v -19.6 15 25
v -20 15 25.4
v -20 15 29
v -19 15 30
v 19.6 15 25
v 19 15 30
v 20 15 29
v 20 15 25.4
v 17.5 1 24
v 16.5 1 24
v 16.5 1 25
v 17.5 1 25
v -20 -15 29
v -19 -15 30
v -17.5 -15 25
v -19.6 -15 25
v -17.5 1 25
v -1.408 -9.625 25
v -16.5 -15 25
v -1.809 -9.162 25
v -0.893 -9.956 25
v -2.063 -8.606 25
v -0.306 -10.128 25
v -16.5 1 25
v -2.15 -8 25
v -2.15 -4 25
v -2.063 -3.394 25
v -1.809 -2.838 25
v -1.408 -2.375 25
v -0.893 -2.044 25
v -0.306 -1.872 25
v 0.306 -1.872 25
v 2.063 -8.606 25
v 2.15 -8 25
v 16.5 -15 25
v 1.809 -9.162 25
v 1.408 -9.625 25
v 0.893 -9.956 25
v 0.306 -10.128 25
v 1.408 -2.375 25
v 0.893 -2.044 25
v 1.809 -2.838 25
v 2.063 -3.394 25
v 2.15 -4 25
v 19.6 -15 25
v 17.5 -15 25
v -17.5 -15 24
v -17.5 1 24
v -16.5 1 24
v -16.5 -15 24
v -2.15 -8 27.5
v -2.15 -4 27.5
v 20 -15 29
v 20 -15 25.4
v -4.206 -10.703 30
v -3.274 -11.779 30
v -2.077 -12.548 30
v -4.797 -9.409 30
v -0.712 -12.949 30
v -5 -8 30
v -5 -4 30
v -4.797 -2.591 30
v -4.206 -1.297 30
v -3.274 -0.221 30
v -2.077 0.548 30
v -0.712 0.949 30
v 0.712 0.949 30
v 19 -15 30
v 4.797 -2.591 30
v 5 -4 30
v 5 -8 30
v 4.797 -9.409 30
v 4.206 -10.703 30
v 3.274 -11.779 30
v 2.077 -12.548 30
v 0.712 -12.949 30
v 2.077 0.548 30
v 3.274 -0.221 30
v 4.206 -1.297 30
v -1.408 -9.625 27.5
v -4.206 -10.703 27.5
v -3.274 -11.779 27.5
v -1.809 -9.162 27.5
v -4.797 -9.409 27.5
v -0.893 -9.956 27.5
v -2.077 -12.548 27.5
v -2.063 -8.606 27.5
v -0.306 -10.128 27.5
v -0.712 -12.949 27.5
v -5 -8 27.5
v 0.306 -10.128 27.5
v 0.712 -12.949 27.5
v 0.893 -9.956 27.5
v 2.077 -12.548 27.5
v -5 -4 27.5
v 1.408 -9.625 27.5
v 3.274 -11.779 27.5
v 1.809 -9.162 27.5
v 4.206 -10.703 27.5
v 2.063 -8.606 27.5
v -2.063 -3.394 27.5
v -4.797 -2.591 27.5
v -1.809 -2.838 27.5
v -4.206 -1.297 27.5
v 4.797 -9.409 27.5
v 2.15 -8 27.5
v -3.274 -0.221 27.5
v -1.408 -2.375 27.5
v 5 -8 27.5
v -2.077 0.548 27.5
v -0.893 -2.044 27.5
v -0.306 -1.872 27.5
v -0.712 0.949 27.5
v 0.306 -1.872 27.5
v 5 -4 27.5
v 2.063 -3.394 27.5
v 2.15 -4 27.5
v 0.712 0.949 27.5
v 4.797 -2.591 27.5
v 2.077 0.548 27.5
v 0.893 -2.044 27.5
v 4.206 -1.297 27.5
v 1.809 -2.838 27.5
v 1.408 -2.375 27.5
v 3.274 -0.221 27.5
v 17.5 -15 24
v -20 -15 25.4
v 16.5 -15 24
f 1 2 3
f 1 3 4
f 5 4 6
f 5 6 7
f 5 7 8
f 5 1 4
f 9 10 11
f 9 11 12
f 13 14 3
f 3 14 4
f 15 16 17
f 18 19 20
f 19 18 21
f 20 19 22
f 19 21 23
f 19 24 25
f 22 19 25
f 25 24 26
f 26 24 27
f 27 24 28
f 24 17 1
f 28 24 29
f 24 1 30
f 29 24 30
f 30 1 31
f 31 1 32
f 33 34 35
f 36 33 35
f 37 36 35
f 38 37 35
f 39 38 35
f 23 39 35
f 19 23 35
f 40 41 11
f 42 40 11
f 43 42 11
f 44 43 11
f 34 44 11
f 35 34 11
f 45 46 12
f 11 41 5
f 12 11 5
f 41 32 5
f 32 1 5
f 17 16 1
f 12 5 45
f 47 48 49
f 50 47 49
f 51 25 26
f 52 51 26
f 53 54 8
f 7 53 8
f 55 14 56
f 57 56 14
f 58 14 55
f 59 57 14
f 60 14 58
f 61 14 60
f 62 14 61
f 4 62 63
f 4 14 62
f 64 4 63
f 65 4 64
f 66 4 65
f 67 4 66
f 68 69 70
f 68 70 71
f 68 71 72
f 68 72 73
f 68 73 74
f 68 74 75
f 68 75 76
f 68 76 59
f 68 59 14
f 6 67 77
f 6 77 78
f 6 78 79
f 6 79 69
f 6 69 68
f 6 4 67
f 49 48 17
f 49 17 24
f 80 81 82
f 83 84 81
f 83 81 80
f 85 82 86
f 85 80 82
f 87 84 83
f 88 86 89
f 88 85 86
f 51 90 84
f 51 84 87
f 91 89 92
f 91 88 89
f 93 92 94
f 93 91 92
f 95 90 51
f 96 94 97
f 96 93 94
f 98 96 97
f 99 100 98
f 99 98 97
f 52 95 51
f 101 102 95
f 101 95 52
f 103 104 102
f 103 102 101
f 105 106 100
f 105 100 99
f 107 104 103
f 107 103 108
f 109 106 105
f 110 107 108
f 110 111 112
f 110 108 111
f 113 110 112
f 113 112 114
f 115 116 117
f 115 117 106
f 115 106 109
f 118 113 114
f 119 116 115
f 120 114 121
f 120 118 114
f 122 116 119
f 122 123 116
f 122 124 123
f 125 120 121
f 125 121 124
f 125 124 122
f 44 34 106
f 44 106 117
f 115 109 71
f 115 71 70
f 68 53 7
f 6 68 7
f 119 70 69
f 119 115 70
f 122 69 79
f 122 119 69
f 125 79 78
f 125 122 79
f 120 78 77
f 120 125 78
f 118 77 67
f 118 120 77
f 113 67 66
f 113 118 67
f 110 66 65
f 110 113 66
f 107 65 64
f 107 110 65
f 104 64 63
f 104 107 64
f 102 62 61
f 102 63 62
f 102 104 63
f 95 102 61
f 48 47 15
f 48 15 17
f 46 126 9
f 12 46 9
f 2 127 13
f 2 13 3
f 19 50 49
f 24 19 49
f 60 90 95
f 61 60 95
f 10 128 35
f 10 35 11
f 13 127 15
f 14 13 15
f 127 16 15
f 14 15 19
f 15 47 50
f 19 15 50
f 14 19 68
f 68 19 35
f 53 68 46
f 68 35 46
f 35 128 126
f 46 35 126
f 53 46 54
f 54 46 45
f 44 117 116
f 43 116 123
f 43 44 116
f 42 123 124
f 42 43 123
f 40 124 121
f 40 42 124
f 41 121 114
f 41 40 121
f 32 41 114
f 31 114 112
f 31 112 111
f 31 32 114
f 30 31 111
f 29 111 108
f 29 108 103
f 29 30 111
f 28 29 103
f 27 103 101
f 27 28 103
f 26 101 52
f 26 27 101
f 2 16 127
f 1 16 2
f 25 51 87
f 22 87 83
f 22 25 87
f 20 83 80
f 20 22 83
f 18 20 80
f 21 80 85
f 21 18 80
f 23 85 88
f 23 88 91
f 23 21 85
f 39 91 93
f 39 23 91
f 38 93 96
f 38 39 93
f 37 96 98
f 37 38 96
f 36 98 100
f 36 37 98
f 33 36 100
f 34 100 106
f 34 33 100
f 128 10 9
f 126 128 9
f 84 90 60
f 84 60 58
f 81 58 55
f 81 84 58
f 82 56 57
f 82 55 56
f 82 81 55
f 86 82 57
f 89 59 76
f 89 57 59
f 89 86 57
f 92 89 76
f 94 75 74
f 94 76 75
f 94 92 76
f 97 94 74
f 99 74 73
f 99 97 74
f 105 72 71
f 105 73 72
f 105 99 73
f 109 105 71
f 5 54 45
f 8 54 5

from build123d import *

# Parameters (mm, degrees)
CYLINDER006_R      = 2.15
CYLINDER006_DEPTH  = 10
CYLINDER005_R      = 2.15
CYLINDER005_DEPTH  = 10
BOX012_W           = 4.3
BOX012_H           = 4
BOX012_DEPTH       = 10
CYLINDER008_R      = 5
CYLINDER008_DEPTH  = 10
BOX013_W           = 10
BOX013_H           = 4
BOX013_DEPTH       = 10
CYLINDER007_R      = 5
CYLINDER007_DEPTH  = 10
BOX010_W           = 1
BOX010_H           = 16
BOX010_DEPTH       = 2
BOX009_W           = 40
BOX009_H           = 30
BOX009_DEPTH       = 5
BOX011_W           = 1
BOX011_H           = 16
BOX011_DEPTH       = 2
CHAMFER003002_SIZE = 1
CHAMFER003003_SIZE = 0.4


with BuildPart() as cylinder006:
    # Cylinder006 → Cylinder006 (new body)
    with BuildSketch(Plane(origin=(0, -8, 0), x_dir=(1, 0, 0), z_dir=(0, 0, 1))):
        Circle(CYLINDER006_R)
    extrude(amount=CYLINDER006_DEPTH)


with BuildPart() as cylinder005:
    # Cylinder005 → Cylinder005 (new body)
    with BuildSketch(Plane(origin=(0, -4, 0), x_dir=(1, 0, 0), z_dir=(0, 0, 1))):
        Circle(CYLINDER005_R)
    extrude(amount=CYLINDER005_DEPTH)


with BuildPart() as fusion009003:
    # Box012 → Box012 (new body)
    with BuildSketch(Plane(origin=(-2.15, -8, 0), x_dir=(1, 0, 0), z_dir=(0, 0, 1))):
        with Locations((2.15, 2)):
            Rectangle(BOX012_W, BOX012_H)
    extrude(amount=BOX012_DEPTH)

    # Fusion009003: union Cylinder006, Cylinder005
    add(cylinder006.part)
    add(cylinder005.part)


with BuildPart() as cylinder008:
    # Cylinder008 → Cylinder008 (new body)
    with BuildSketch(Plane(origin=(0, -8, 0), x_dir=(1, 0, 0), z_dir=(0, 0, 1))):
        Circle(CYLINDER008_R)
    extrude(amount=CYLINDER008_DEPTH)


with BuildPart() as cube013:
    # Box013 → Box013 (new body)
    with BuildSketch(Plane(origin=(-5, -8, 0), x_dir=(1, 0, 0), z_dir=(0, 0, 1))):
        with Locations((5, 2)):
            Rectangle(BOX013_W, BOX013_H)
    extrude(amount=BOX013_DEPTH)


with BuildPart() as fusion009005:
    # Cylinder007 → Cylinder007 (new body)
    with BuildSketch(Plane(origin=(0, -4, 0), x_dir=(1, 0, 0), z_dir=(0, 0, 1))):
        Circle(CYLINDER007_R)
    extrude(amount=CYLINDER007_DEPTH)

    # Fusion009004: union Cylinder008, Cube013
    add(cylinder008.part)
    add(cube013.part)


with BuildPart() as fusion009005_1:
    # Fusion009004 placement: moved
    add(fusion009005.part.moved(Location((0, 0, 10))))

    # Fusion009005: union Fusion009003
    add(fusion009003.part)


with BuildPart() as fusion009005_2:
    # Fusion009005 placement: moved
    add(fusion009005_1.part.moved(Location((0, 0, 17.5))))


with BuildPart() as cube010:
    # Box010 → Box010 (new body)
    with BuildSketch(Plane(origin=(-17.5, -15, 24), x_dir=(1, 0, 0), z_dir=(0, 0, 1))):
        with Locations((0.5, 8)):
            Rectangle(BOX010_W, BOX010_H)
    extrude(amount=BOX010_DEPTH)


with BuildPart() as cube009:
    # Box009 → Box009 (new body)
    with BuildSketch(Plane(origin=(-20, -15, 25), x_dir=(1, 0, 0), z_dir=(0, 0, 1))):
        with Locations((20, 15)):
            Rectangle(BOX009_W, BOX009_H)
    extrude(amount=BOX009_DEPTH)


with BuildPart() as cut006:
    # Box011 → Box011 (new body)
    with BuildSketch(Plane(origin=(16.5, -15, 24), x_dir=(1, 0, 0), z_dir=(0, 0, 1))):
        with Locations((0.5, 8)):
            Rectangle(BOX011_W, BOX011_H)
    extrude(amount=BOX011_DEPTH)

    # Fusion009002: union Cube010, Cube009
    add(cube010.part)
    add(cube009.part)

    # Chamfer003002
    chamfer003002_edges = [cut006.edges().sort_by_distance(p)[0] for p in [
        (20, 0, 30),
        (-20, 0, 30),
    ]]
    chamfer(chamfer003002_edges, length=CHAMFER003002_SIZE)

    # Chamfer003003
    chamfer003003_edges = [cut006.edges().sort_by_distance(p)[0] for p in [
        (20, 0, 25),
        (-20, 0, 25),
    ]]
    chamfer(chamfer003003_edges, length=CHAMFER003003_SIZE)

    # Cut006: cut Fusion009005
    add(fusion009005_2.part, mode=Mode.SUBTRACT)


solid = cut006.part
